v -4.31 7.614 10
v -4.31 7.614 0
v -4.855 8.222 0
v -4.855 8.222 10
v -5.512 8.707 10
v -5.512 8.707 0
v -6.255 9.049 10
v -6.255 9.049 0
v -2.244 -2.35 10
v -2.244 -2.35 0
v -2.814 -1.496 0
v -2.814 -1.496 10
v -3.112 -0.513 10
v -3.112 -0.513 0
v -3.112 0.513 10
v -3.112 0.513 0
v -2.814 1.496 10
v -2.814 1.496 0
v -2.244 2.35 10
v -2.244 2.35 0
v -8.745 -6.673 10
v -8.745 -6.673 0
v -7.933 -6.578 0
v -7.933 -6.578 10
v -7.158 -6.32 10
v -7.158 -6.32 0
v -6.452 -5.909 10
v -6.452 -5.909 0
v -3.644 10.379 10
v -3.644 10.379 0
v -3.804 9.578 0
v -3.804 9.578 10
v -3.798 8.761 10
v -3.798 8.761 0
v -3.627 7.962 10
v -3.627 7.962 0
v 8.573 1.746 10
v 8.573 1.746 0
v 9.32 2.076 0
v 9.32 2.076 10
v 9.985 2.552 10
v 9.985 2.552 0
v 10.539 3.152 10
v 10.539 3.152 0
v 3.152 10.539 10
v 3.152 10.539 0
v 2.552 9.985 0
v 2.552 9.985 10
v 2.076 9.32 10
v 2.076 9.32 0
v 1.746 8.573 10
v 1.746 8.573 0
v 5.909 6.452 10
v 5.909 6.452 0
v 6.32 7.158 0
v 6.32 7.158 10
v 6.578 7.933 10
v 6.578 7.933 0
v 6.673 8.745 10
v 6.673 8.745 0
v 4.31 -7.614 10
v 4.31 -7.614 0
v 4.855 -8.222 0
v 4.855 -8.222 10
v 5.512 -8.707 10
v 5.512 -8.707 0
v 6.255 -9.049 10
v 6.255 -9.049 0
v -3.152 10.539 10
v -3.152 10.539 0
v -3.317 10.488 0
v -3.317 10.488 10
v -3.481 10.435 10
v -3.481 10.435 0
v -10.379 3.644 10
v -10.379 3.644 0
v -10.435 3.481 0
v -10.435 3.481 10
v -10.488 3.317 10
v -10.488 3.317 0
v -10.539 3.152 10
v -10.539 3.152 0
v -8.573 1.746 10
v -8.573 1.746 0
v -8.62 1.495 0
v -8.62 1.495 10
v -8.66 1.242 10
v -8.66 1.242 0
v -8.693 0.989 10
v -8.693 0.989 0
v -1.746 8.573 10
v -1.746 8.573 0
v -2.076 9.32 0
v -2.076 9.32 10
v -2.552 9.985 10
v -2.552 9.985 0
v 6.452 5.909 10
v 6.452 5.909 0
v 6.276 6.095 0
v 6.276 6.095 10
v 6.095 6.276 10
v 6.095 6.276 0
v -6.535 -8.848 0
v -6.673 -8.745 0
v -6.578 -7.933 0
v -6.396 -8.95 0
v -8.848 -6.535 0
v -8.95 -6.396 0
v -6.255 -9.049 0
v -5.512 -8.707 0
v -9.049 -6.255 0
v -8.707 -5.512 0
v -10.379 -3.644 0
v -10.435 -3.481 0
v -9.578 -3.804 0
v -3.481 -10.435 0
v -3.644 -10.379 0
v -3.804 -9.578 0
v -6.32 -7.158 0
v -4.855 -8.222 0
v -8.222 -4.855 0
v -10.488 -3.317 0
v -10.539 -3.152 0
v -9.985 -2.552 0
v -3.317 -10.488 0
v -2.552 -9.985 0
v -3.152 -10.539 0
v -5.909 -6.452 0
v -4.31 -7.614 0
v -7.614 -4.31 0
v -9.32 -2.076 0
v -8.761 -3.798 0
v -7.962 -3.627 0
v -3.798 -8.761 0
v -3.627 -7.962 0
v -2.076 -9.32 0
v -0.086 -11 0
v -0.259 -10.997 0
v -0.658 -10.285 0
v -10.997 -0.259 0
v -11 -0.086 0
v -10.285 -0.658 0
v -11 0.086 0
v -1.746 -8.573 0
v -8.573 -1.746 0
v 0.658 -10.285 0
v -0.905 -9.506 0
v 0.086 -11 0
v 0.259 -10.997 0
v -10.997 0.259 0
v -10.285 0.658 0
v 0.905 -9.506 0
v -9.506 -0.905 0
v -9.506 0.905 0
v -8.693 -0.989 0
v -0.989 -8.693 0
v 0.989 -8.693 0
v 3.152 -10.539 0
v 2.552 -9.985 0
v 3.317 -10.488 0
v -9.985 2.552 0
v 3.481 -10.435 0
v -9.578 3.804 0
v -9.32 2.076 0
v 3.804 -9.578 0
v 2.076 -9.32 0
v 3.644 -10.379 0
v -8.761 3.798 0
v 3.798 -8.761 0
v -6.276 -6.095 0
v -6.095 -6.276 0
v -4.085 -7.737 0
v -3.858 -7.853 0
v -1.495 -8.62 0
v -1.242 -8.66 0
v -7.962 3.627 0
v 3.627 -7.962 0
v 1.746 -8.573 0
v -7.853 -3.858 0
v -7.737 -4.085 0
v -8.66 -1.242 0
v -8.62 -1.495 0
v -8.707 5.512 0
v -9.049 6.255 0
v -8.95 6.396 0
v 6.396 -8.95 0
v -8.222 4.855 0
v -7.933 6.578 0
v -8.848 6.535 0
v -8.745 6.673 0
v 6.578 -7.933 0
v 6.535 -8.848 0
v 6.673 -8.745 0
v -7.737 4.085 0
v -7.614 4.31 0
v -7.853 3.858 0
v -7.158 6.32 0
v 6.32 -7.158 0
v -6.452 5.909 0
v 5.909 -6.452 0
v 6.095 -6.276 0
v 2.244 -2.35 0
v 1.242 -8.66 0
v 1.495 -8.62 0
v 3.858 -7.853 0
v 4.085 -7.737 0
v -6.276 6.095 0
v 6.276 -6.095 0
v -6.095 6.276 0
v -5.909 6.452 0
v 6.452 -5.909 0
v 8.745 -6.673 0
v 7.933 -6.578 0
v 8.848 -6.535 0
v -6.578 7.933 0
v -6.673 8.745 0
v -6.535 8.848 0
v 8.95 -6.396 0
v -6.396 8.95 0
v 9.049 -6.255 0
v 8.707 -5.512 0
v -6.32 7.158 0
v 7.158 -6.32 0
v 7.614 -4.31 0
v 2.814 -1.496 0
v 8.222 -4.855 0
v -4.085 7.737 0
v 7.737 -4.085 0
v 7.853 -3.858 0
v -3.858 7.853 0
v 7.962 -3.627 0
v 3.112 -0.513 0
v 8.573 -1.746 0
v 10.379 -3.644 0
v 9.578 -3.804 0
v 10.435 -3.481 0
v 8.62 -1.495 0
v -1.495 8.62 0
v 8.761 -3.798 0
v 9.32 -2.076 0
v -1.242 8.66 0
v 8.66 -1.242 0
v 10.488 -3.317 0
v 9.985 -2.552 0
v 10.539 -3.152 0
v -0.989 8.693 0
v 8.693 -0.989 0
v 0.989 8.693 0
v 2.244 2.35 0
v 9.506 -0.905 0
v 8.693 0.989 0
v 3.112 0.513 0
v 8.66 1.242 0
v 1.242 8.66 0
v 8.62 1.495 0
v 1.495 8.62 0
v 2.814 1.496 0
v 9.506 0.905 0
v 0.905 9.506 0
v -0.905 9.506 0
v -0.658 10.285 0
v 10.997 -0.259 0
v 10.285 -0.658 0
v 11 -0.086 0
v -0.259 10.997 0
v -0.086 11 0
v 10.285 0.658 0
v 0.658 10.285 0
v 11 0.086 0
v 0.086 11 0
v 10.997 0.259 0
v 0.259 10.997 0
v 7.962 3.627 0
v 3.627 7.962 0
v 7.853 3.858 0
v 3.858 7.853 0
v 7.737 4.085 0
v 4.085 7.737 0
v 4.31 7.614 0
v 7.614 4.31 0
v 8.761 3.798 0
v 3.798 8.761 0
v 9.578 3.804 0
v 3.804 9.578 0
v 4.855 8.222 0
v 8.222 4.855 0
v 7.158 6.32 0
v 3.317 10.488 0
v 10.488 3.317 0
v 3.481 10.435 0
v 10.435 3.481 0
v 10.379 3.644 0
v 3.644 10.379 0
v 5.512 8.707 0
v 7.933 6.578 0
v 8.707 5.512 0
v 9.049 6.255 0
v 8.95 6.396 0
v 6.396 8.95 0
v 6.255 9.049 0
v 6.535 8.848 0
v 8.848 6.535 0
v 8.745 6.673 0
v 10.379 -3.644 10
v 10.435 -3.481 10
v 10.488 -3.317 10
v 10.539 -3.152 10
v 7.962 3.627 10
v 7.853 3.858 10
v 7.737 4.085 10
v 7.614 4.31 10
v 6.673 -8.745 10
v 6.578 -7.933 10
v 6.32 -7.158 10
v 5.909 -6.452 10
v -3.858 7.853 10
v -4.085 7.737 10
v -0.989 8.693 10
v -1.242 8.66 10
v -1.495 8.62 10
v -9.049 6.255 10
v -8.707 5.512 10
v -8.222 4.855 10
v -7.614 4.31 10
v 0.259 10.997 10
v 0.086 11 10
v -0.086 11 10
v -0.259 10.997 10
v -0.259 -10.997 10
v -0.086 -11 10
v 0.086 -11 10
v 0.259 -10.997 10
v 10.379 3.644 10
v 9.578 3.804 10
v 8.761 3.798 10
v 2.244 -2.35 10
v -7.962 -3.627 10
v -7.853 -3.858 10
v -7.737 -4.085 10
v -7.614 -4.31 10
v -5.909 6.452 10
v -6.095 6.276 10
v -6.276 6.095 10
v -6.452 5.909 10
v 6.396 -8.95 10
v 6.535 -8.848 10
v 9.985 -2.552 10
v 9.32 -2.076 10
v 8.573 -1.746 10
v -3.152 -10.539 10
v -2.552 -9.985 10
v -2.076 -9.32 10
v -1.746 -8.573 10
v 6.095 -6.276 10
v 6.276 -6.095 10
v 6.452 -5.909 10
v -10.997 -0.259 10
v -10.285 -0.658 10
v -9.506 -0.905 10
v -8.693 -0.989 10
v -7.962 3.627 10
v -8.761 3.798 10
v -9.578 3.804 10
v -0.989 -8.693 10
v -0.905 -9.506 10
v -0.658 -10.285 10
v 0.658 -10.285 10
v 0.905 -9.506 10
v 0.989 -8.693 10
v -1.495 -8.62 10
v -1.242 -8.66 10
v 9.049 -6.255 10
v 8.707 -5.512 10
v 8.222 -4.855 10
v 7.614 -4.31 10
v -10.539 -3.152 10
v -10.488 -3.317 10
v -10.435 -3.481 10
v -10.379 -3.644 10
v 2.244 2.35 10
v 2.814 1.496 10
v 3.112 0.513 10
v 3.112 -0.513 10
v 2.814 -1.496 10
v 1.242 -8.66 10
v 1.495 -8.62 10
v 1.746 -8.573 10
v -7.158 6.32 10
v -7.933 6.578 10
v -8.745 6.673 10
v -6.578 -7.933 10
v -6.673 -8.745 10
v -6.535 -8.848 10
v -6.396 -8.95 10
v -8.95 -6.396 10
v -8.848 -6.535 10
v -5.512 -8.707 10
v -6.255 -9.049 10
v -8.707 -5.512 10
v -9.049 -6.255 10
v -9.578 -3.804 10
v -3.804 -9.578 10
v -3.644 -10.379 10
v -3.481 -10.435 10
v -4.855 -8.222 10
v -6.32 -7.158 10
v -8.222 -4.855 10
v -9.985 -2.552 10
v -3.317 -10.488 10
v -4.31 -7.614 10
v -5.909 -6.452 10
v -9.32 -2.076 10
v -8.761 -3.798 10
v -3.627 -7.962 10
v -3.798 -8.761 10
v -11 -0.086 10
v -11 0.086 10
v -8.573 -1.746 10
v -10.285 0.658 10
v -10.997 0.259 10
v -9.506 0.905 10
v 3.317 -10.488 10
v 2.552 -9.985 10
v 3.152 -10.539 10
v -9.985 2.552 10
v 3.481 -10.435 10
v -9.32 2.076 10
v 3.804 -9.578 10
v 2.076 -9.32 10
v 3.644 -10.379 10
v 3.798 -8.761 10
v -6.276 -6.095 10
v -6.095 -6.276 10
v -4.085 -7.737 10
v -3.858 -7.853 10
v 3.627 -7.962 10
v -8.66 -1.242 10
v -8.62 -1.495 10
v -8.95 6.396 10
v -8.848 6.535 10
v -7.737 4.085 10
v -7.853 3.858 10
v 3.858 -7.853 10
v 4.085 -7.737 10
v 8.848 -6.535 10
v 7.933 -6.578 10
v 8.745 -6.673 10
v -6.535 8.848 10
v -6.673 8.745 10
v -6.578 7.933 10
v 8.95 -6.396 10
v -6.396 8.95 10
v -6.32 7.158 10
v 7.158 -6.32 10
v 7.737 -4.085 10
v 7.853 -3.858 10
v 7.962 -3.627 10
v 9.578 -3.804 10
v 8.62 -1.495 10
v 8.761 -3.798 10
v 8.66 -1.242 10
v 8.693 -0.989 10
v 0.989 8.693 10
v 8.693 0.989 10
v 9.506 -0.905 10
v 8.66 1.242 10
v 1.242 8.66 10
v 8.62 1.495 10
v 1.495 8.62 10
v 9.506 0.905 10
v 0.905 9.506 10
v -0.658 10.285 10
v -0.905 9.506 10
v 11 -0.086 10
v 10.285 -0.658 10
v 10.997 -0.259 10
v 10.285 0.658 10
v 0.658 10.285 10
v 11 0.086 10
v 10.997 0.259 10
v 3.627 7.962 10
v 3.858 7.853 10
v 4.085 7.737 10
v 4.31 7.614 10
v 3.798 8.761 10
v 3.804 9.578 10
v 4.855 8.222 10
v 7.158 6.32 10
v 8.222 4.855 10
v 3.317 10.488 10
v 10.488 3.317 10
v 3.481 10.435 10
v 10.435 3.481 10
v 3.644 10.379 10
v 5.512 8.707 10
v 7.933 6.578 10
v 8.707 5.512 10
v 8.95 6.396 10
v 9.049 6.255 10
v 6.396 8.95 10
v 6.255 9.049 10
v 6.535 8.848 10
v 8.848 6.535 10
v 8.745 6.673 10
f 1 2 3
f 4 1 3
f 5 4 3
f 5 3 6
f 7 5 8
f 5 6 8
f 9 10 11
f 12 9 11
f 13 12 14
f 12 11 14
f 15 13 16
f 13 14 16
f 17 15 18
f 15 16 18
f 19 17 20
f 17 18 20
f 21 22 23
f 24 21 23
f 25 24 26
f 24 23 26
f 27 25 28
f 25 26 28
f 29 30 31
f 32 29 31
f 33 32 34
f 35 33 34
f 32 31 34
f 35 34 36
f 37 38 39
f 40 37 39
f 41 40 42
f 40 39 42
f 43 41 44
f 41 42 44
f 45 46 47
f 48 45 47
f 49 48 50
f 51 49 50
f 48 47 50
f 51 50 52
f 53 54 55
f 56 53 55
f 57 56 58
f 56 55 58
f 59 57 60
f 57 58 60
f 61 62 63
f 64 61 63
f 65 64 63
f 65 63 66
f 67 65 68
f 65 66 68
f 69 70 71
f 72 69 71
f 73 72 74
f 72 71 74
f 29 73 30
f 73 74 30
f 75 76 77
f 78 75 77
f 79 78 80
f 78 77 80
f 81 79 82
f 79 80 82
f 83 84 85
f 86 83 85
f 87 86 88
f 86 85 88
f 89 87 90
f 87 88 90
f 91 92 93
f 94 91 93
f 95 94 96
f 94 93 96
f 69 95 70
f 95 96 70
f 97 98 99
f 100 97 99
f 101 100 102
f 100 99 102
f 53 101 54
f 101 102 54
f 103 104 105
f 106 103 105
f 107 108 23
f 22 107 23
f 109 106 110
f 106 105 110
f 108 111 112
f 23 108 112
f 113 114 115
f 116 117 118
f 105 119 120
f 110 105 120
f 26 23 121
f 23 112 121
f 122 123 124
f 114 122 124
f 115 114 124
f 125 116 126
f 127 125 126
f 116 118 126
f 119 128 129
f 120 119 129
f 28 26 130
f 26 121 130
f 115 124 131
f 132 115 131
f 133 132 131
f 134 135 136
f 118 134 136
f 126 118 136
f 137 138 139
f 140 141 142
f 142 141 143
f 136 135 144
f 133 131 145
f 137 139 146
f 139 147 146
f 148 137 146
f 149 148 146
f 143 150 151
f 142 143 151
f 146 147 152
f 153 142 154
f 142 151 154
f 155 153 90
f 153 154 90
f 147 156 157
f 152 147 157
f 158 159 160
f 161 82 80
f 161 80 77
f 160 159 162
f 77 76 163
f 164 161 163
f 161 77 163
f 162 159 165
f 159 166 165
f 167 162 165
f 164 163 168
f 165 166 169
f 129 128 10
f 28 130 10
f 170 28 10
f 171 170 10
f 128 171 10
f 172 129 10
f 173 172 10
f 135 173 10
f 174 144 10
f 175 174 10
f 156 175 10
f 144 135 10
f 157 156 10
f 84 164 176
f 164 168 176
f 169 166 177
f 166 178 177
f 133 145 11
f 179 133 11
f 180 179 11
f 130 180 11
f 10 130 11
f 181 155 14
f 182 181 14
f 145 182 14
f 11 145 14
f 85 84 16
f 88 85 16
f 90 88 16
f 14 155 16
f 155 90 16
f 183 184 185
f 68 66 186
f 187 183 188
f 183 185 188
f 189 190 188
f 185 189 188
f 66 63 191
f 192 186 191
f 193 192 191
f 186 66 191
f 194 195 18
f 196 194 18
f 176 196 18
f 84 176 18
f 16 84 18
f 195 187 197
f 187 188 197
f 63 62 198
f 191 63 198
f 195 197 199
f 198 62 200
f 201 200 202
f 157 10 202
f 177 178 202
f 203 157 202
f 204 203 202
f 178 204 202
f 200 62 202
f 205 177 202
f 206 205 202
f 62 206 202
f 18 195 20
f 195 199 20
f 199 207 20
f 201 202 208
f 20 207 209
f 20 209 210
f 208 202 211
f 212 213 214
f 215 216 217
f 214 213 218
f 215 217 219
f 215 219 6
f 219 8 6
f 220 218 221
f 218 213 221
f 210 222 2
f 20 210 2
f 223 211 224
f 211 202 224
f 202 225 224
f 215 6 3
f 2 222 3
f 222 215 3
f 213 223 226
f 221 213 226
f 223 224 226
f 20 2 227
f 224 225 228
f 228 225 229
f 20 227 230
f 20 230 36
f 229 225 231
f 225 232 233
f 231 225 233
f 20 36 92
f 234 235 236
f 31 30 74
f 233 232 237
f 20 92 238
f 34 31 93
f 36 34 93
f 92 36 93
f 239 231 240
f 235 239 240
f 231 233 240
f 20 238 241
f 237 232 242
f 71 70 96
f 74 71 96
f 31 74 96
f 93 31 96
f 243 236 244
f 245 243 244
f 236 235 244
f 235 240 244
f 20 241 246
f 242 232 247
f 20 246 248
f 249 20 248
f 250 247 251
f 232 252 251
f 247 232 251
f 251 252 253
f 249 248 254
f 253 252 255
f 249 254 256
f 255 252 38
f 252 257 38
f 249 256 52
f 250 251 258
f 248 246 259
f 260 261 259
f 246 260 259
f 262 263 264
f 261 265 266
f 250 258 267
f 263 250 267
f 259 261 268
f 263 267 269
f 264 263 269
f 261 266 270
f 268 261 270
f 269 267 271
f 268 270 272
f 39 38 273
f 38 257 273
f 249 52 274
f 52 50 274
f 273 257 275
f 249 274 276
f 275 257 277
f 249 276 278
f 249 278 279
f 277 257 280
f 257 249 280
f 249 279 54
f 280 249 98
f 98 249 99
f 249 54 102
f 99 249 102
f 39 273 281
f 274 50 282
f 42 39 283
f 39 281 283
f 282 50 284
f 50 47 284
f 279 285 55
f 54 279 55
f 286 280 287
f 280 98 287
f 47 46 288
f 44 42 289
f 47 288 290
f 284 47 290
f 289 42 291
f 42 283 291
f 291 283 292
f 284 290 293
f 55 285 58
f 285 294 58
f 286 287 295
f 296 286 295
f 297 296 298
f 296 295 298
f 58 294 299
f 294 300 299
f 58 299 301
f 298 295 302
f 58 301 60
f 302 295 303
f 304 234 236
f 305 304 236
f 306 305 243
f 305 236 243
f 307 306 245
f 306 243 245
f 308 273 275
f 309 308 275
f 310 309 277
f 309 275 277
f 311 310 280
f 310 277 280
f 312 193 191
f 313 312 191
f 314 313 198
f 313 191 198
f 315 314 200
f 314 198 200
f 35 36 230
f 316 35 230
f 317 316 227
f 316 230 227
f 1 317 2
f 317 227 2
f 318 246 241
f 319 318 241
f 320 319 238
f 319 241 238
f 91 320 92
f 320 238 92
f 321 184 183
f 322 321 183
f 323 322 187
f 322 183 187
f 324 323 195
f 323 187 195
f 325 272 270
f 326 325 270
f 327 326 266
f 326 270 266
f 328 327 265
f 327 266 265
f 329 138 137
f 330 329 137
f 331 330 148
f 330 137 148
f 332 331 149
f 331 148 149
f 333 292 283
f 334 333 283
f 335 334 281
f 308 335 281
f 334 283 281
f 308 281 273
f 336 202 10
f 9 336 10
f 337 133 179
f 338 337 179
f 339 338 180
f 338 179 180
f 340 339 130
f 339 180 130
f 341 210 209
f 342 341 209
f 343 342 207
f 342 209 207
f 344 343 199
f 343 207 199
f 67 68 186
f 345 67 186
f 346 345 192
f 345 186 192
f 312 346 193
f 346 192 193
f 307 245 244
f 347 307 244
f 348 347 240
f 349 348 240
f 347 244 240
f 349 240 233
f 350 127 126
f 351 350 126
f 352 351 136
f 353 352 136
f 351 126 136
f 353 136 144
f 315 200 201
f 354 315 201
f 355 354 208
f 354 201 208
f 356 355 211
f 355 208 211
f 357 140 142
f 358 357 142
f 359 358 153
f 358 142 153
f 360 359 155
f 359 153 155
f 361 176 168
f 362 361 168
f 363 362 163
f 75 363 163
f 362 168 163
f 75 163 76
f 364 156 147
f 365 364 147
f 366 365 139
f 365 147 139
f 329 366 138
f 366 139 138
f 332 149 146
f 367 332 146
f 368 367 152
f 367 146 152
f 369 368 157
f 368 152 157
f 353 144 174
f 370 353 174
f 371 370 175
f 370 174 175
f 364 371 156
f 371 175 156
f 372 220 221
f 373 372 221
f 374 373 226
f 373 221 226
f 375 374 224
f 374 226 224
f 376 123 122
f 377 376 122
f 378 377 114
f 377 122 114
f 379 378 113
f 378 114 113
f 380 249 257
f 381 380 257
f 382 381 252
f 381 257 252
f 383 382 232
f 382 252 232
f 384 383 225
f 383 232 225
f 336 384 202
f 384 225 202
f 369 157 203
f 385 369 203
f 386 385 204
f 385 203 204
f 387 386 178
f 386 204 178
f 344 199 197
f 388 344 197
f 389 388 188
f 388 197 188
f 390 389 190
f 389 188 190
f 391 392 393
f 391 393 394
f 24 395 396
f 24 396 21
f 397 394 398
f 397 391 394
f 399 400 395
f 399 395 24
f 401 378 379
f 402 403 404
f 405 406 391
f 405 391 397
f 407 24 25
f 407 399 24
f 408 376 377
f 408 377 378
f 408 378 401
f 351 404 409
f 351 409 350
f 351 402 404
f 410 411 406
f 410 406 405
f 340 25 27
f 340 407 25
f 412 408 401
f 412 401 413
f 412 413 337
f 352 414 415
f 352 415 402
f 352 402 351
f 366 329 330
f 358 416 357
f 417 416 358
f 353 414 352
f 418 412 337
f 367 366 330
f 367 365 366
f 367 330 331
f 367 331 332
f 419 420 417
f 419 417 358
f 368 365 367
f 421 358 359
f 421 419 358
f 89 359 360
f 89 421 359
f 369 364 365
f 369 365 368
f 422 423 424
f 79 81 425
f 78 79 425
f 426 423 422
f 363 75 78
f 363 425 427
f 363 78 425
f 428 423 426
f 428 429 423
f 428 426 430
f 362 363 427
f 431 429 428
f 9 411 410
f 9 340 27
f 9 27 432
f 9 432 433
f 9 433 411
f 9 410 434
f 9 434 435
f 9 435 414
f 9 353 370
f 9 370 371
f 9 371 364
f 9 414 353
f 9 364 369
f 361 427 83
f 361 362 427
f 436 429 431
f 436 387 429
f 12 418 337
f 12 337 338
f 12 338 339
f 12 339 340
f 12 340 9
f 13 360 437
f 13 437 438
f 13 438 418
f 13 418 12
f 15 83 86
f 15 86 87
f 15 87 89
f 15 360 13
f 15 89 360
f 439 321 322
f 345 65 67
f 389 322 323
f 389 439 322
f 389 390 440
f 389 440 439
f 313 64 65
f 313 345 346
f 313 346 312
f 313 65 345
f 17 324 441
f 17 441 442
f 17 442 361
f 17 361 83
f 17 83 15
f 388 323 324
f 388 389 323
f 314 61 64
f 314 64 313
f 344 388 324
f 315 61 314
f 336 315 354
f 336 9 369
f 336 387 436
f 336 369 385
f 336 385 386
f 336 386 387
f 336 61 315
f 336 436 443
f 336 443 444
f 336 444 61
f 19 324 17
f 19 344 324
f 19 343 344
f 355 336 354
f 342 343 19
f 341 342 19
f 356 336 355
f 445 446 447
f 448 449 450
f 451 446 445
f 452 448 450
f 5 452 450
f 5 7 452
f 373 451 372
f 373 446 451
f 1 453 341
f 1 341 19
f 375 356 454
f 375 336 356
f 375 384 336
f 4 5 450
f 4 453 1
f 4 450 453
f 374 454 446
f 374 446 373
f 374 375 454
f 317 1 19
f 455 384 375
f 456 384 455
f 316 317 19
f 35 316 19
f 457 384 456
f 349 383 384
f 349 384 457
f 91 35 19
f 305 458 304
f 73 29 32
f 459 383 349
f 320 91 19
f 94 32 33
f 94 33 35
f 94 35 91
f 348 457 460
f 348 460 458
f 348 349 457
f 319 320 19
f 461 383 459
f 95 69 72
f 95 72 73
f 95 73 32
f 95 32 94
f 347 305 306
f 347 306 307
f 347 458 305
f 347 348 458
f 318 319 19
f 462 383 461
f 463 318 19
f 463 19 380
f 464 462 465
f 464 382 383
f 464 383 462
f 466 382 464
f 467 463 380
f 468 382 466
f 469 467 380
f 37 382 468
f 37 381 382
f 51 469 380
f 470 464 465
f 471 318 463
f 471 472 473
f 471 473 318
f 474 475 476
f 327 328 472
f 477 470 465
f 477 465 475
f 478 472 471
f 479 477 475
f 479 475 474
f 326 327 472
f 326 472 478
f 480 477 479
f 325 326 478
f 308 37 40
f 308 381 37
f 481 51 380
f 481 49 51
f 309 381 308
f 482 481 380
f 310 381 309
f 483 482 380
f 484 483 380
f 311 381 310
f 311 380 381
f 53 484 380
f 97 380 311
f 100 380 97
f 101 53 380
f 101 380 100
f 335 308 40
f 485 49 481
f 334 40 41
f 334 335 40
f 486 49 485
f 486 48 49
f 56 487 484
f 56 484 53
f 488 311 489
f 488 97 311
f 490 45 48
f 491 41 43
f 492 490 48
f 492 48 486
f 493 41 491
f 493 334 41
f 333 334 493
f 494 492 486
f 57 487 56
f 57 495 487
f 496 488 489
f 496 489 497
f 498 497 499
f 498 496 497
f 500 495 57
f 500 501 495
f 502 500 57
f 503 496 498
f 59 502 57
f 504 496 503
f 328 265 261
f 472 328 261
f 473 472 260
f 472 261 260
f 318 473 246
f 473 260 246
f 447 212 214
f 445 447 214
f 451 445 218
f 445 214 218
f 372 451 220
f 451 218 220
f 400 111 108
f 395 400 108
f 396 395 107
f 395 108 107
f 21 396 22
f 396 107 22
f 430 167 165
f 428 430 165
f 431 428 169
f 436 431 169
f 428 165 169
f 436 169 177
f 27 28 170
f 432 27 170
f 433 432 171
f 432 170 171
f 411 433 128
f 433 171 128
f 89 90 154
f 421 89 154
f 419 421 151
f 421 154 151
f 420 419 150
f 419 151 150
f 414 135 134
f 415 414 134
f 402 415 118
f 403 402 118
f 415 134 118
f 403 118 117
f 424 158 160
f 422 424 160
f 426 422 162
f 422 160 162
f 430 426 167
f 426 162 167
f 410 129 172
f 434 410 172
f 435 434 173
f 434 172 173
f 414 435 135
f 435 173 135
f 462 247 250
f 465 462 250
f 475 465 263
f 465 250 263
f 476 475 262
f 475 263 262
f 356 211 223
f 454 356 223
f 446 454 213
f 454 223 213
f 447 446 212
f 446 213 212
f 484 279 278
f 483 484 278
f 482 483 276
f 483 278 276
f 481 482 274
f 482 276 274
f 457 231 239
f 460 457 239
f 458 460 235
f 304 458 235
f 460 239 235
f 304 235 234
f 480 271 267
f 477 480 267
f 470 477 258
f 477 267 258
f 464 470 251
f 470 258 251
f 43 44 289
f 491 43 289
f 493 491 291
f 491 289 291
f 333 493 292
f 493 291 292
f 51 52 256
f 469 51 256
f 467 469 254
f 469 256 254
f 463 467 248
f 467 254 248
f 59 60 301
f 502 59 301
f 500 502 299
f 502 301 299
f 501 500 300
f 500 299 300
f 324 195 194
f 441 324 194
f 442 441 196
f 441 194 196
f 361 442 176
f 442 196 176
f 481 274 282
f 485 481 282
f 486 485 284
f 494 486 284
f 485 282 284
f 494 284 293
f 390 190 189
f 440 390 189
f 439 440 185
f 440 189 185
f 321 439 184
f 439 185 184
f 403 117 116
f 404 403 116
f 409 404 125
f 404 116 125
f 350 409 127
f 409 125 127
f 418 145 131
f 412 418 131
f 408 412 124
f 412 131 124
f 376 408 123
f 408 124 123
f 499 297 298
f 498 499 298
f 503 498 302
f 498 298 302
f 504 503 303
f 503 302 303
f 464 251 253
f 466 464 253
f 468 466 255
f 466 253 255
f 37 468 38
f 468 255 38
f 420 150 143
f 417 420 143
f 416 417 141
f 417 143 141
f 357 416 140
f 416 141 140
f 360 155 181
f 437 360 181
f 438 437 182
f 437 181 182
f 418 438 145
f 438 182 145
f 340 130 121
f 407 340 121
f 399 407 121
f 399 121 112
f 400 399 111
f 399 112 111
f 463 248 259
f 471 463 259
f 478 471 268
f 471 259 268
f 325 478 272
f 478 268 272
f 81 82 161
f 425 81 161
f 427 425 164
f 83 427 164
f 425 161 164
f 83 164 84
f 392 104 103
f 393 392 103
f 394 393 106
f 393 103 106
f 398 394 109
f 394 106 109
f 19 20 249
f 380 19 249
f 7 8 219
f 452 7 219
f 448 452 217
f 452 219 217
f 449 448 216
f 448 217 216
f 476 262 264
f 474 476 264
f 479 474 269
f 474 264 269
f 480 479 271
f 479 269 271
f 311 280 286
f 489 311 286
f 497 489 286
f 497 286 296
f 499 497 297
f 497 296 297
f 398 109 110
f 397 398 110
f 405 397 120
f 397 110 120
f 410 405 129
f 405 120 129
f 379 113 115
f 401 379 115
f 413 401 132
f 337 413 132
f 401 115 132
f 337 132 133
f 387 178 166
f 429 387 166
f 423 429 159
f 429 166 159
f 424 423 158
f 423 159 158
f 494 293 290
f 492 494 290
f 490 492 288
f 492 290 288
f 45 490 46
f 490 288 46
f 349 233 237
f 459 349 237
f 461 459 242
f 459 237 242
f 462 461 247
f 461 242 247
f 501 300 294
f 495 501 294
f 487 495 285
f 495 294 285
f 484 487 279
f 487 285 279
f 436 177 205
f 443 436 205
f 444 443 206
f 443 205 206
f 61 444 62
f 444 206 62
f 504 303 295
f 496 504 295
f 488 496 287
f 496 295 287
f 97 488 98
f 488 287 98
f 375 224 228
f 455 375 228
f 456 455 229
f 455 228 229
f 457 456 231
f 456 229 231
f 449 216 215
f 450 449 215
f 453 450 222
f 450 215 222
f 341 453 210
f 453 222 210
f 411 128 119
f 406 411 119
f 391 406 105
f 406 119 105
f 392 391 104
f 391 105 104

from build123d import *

# Parameters (mm, degrees)
BOSS_EXTRUDE1_DEPTH = 10


with BuildPart() as part:
    # Sketch1 → Boss-Extrude1 (new body)
    with BuildSketch(Plane.XY):
        with BuildLine():
            ThreePointArc((10.996962206, -0.2585), (11, 0), (10.996962206, 0.2585))
            ThreePointArc((10.996962206, 0.2585), (9.901430175, 0.801787583), (8.692954638, 0.988706562))
            ThreePointArc((8.692954638, 0.988706562), (8.641285292, 1.368645135), (8.573018284, 1.745954896))
            ThreePointArc((8.573018284, 1.745954896), (9.664585678, 2.297164887), (10.538613458, 3.152400099))
            ThreePointArc((10.538613458, 3.152400099), (10.461621679, 3.399186938), (10.378851672, 3.644096317))
            ThreePointArc((10.378851672, 3.644096317), (9.169053699, 3.822255499), (7.961964024, 3.626586533))
            ThreePointArc((7.961964024, 3.626586533), (7.79541608, 3.971962882), (7.613895169, 4.309710124))
            ThreePointArc((7.613895169, 4.309710124), (8.481704197, 5.171254853), (9.048671798, 6.254721311))
            ThreePointArc((9.048671798, 6.254721311), (8.899186938, 6.465637775), (8.744786823, 6.672983097))
            ThreePointArc((8.744786823, 6.672983097), (7.539146363, 6.468574414), (6.451600897, 5.909470946))
            ThreePointArc((6.451600897, 5.909470946), (6.186477229, 6.186477229), (5.909470946, 6.451600897))
            ThreePointArc((5.909470946, 6.451600897), (6.468574414, 7.539146363), (6.672983097, 8.744786823))
            ThreePointArc((6.672983097, 8.744786823), (6.465637775, 8.899186938), (6.254721311, 9.048671798))
            ThreePointArc((6.254721311, 9.048671798), (5.171254853, 8.481704197), (4.309710124, 7.613895169))
            ThreePointArc((4.309710124, 7.613895169), (3.971962882, 7.79541608), (3.626586533, 7.961964024))
            ThreePointArc((3.626586533, 7.961964024), (3.822255499, 9.169053699), (3.644096317, 10.378851672))
            ThreePointArc((3.644096317, 10.378851672), (3.399186938, 10.461621679), (3.152400099, 10.538613458))
            ThreePointArc((3.152400099, 10.538613458), (2.297164887, 9.664585678), (1.745954896, 8.573018284))
            ThreePointArc((1.745954896, 8.573018284), (1.368645135, 8.641285292), (0.988706562, 8.692954638))
            ThreePointArc((0.988706562, 8.692954638), (0.801787583, 9.901430175), (0.2585, 10.996962206))
            ThreePointArc((0.2585, 10.996962206), (0, 11), (-0.2585, 10.996962206))
            ThreePointArc((-0.2585, 10.996962206), (-0.801787583, 9.901430175), (-0.988706562, 8.692954638))
            ThreePointArc((-0.988706562, 8.692954638), (-1.368645135, 8.641285292), (-1.745954896, 8.573018284))
            ThreePointArc((-1.745954896, 8.573018284), (-2.297164887, 9.664585678), (-3.152400099, 10.538613458))
            ThreePointArc((-3.152400099, 10.538613458), (-3.399186938, 10.461621679), (-3.644096317, 10.378851672))
            ThreePointArc((-3.644096317, 10.378851672), (-3.822255499, 9.169053699), (-3.626586533, 7.961964024))
            ThreePointArc((-3.626586533, 7.961964024), (-3.971962882, 7.79541608), (-4.309710124, 7.613895169))
            ThreePointArc((-4.309710124, 7.613895169), (-5.171254853, 8.481704197), (-6.254721311, 9.048671798))
            ThreePointArc((-6.254721311, 9.048671798), (-6.465637775, 8.899186938), (-6.672983097, 8.744786823))
            ThreePointArc((-6.672983097, 8.744786823), (-6.468574414, 7.539146363), (-5.909470946, 6.451600897))
            ThreePointArc((-5.909470946, 6.451600897), (-6.186477229, 6.186477229), (-6.451600897, 5.909470946))
            ThreePointArc((-6.451600897, 5.909470946), (-7.539146363, 6.468574414), (-8.744786823, 6.672983097))
            ThreePointArc((-8.744786823, 6.672983097), (-8.899186938, 6.465637775), (-9.048671798, 6.254721311))
            ThreePointArc((-9.048671798, 6.254721311), (-8.481704197, 5.171254853), (-7.613895169, 4.309710124))
            ThreePointArc((-7.613895169, 4.309710124), (-7.79541608, 3.971962882), (-7.961964024, 3.626586533))
            ThreePointArc((-7.961964024, 3.626586533), (-9.169053699, 3.822255499), (-10.378851672, 3.644096317))
            ThreePointArc((-10.378851672, 3.644096317), (-10.461621679, 3.399186938), (-10.538613458, 3.152400099))
            ThreePointArc((-10.538613458, 3.152400099), (-9.664585678, 2.297164887), (-8.573018284, 1.745954896))
            ThreePointArc((-8.573018284, 1.745954896), (-8.641285292, 1.368645135), (-8.692954638, 0.988706562))
            ThreePointArc((-8.692954638, 0.988706562), (-9.901430175, 0.801787583), (-10.996962206, 0.2585))
            ThreePointArc((-10.996962206, 0.2585), (-11, 0), (-10.996962206, -0.2585))
            ThreePointArc((-10.996962206, -0.2585), (-9.901430175, -0.801787583), (-8.692954638, -0.988706562))
            ThreePointArc((-8.692954638, -0.988706562), (-8.641285292, -1.368645135), (-8.573018284, -1.745954896))
            ThreePointArc((-8.573018284, -1.745954896), (-9.664585678, -2.297164887), (-10.538613458, -3.152400099))
            ThreePointArc((-10.538613458, -3.152400099), (-10.461621679, -3.399186938), (-10.378851672, -3.644096317))
            ThreePointArc((-10.378851672, -3.644096317), (-9.169053699, -3.822255499), (-7.961964024, -3.626586533))
            ThreePointArc((-7.961964024, -3.626586533), (-7.79541608, -3.971962882), (-7.613895169, -4.309710124))
            ThreePointArc((-7.613895169, -4.309710124), (-8.481704197, -5.171254853), (-9.048671798, -6.254721311))
            ThreePointArc((-9.048671798, -6.254721311), (-8.899186938, -6.465637775), (-8.744786823, -6.672983097))
            ThreePointArc((-8.744786823, -6.672983097), (-7.539146363, -6.468574414), (-6.451600897, -5.909470946))
            ThreePointArc((-6.451600897, -5.909470946), (-6.186477229, -6.186477229), (-5.909470946, -6.451600897))
            ThreePointArc((-5.909470946, -6.451600897), (-6.468574414, -7.539146363), (-6.672983097, -8.744786823))
            ThreePointArc((-6.672983097, -8.744786823), (-6.465637775, -8.899186938), (-6.254721311, -9.048671798))
            ThreePointArc((-6.254721311, -9.048671798), (-5.171254853, -8.481704197), (-4.309710124, -7.613895169))
            ThreePointArc((-4.309710124, -7.613895169), (-3.971962882, -7.79541608), (-3.626586533, -7.961964024))
            ThreePointArc((-3.626586533, -7.961964024), (-3.822255499, -9.169053699), (-3.644096317, -10.378851672))
            ThreePointArc((-3.644096317, -10.378851672), (-3.399186938, -10.461621679), (-3.152400099, -10.538613458))
            ThreePointArc((-3.152400099, -10.538613458), (-2.297164887, -9.664585678), (-1.745954896, -8.573018284))
            ThreePointArc((-1.745954896, -8.573018284), (-1.368645135, -8.641285292), (-0.988706562, -8.692954638))
            ThreePointArc((-0.988706562, -8.692954638), (-0.801787583, -9.901430175), (-0.2585, -10.996962206))
            ThreePointArc((-0.2585, -10.996962206), (0, -11), (0.2585, -10.996962206))
            ThreePointArc((0.2585, -10.996962206), (0.801787583, -9.901430175), (0.988706562, -8.692954638))
            ThreePointArc((0.988706562, -8.692954638), (1.368645135, -8.641285292), (1.745954896, -8.573018284))
            ThreePointArc((1.745954896, -8.573018284), (2.297164887, -9.664585678), (3.152400099, -10.538613458))
            ThreePointArc((3.152400099, -10.538613458), (3.399186938, -10.461621679), (3.644096317, -10.378851672))
            ThreePointArc((3.644096317, -10.378851672), (3.822255499, -9.169053699), (3.626586533, -7.961964024))
            ThreePointArc((3.626586533, -7.961964024), (3.971962882, -7.79541608), (4.309710124, -7.613895169))
            ThreePointArc((4.309710124, -7.613895169), (5.171254853, -8.481704197), (6.254721311, -9.048671798))
            ThreePointArc((6.254721311, -9.048671798), (6.465637775, -8.899186938), (6.672983097, -8.744786823))
            ThreePointArc((6.672983097, -8.744786823), (6.468574414, -7.539146363), (5.909470946, -6.451600897))
            ThreePointArc((5.909470946, -6.451600897), (6.186477229, -6.186477229), (6.451600897, -5.909470946))
            ThreePointArc((6.451600897, -5.909470946), (7.539146363, -6.468574414), (8.744786823, -6.672983097))
            ThreePointArc((8.744786823, -6.672983097), (8.899186938, -6.465637775), (9.048671798, -6.254721311))
            ThreePointArc((9.048671798, -6.254721311), (8.481704197, -5.171254853), (7.613895169, -4.309710124))
            ThreePointArc((7.613895169, -4.309710124), (7.79541608, -3.971962882), (7.961964024, -3.626586533))
            ThreePointArc((7.961964024, -3.626586533), (9.169053699, -3.822255499), (10.378851672, -3.644096317))
            ThreePointArc((10.378851672, -3.644096317), (10.461621679, -3.399186938), (10.538613458, -3.152400099))
            ThreePointArc((10.538613458, -3.152400099), (9.664585678, -2.297164887), (8.573018284, -1.745954896))
            ThreePointArc((8.573018284, -1.745954896), (8.641285292, -1.368645135), (8.692954638, -0.988706562))
            ThreePointArc((8.692954638, -0.988706562), (9.901430175, -0.801787583), (10.996962206, -0.2585))
        make_face()
        with BuildLine():
            Line((-2.24374247, 2.35), (2.24374247, 2.35))
            ThreePointArc((2.24374247, 2.35), (3.15, 0), (2.24374247, -2.35))
            Line((2.24374247, -2.35), (-2.24374247, -2.35))
            ThreePointArc((-2.24374247, -2.35), (-3.15, 0), (-2.24374247, 2.35))
        make_face(mode=Mode.SUBTRACT)
    extrude(amount=BOSS_EXTRUDE1_DEPTH)


solid = part.part
